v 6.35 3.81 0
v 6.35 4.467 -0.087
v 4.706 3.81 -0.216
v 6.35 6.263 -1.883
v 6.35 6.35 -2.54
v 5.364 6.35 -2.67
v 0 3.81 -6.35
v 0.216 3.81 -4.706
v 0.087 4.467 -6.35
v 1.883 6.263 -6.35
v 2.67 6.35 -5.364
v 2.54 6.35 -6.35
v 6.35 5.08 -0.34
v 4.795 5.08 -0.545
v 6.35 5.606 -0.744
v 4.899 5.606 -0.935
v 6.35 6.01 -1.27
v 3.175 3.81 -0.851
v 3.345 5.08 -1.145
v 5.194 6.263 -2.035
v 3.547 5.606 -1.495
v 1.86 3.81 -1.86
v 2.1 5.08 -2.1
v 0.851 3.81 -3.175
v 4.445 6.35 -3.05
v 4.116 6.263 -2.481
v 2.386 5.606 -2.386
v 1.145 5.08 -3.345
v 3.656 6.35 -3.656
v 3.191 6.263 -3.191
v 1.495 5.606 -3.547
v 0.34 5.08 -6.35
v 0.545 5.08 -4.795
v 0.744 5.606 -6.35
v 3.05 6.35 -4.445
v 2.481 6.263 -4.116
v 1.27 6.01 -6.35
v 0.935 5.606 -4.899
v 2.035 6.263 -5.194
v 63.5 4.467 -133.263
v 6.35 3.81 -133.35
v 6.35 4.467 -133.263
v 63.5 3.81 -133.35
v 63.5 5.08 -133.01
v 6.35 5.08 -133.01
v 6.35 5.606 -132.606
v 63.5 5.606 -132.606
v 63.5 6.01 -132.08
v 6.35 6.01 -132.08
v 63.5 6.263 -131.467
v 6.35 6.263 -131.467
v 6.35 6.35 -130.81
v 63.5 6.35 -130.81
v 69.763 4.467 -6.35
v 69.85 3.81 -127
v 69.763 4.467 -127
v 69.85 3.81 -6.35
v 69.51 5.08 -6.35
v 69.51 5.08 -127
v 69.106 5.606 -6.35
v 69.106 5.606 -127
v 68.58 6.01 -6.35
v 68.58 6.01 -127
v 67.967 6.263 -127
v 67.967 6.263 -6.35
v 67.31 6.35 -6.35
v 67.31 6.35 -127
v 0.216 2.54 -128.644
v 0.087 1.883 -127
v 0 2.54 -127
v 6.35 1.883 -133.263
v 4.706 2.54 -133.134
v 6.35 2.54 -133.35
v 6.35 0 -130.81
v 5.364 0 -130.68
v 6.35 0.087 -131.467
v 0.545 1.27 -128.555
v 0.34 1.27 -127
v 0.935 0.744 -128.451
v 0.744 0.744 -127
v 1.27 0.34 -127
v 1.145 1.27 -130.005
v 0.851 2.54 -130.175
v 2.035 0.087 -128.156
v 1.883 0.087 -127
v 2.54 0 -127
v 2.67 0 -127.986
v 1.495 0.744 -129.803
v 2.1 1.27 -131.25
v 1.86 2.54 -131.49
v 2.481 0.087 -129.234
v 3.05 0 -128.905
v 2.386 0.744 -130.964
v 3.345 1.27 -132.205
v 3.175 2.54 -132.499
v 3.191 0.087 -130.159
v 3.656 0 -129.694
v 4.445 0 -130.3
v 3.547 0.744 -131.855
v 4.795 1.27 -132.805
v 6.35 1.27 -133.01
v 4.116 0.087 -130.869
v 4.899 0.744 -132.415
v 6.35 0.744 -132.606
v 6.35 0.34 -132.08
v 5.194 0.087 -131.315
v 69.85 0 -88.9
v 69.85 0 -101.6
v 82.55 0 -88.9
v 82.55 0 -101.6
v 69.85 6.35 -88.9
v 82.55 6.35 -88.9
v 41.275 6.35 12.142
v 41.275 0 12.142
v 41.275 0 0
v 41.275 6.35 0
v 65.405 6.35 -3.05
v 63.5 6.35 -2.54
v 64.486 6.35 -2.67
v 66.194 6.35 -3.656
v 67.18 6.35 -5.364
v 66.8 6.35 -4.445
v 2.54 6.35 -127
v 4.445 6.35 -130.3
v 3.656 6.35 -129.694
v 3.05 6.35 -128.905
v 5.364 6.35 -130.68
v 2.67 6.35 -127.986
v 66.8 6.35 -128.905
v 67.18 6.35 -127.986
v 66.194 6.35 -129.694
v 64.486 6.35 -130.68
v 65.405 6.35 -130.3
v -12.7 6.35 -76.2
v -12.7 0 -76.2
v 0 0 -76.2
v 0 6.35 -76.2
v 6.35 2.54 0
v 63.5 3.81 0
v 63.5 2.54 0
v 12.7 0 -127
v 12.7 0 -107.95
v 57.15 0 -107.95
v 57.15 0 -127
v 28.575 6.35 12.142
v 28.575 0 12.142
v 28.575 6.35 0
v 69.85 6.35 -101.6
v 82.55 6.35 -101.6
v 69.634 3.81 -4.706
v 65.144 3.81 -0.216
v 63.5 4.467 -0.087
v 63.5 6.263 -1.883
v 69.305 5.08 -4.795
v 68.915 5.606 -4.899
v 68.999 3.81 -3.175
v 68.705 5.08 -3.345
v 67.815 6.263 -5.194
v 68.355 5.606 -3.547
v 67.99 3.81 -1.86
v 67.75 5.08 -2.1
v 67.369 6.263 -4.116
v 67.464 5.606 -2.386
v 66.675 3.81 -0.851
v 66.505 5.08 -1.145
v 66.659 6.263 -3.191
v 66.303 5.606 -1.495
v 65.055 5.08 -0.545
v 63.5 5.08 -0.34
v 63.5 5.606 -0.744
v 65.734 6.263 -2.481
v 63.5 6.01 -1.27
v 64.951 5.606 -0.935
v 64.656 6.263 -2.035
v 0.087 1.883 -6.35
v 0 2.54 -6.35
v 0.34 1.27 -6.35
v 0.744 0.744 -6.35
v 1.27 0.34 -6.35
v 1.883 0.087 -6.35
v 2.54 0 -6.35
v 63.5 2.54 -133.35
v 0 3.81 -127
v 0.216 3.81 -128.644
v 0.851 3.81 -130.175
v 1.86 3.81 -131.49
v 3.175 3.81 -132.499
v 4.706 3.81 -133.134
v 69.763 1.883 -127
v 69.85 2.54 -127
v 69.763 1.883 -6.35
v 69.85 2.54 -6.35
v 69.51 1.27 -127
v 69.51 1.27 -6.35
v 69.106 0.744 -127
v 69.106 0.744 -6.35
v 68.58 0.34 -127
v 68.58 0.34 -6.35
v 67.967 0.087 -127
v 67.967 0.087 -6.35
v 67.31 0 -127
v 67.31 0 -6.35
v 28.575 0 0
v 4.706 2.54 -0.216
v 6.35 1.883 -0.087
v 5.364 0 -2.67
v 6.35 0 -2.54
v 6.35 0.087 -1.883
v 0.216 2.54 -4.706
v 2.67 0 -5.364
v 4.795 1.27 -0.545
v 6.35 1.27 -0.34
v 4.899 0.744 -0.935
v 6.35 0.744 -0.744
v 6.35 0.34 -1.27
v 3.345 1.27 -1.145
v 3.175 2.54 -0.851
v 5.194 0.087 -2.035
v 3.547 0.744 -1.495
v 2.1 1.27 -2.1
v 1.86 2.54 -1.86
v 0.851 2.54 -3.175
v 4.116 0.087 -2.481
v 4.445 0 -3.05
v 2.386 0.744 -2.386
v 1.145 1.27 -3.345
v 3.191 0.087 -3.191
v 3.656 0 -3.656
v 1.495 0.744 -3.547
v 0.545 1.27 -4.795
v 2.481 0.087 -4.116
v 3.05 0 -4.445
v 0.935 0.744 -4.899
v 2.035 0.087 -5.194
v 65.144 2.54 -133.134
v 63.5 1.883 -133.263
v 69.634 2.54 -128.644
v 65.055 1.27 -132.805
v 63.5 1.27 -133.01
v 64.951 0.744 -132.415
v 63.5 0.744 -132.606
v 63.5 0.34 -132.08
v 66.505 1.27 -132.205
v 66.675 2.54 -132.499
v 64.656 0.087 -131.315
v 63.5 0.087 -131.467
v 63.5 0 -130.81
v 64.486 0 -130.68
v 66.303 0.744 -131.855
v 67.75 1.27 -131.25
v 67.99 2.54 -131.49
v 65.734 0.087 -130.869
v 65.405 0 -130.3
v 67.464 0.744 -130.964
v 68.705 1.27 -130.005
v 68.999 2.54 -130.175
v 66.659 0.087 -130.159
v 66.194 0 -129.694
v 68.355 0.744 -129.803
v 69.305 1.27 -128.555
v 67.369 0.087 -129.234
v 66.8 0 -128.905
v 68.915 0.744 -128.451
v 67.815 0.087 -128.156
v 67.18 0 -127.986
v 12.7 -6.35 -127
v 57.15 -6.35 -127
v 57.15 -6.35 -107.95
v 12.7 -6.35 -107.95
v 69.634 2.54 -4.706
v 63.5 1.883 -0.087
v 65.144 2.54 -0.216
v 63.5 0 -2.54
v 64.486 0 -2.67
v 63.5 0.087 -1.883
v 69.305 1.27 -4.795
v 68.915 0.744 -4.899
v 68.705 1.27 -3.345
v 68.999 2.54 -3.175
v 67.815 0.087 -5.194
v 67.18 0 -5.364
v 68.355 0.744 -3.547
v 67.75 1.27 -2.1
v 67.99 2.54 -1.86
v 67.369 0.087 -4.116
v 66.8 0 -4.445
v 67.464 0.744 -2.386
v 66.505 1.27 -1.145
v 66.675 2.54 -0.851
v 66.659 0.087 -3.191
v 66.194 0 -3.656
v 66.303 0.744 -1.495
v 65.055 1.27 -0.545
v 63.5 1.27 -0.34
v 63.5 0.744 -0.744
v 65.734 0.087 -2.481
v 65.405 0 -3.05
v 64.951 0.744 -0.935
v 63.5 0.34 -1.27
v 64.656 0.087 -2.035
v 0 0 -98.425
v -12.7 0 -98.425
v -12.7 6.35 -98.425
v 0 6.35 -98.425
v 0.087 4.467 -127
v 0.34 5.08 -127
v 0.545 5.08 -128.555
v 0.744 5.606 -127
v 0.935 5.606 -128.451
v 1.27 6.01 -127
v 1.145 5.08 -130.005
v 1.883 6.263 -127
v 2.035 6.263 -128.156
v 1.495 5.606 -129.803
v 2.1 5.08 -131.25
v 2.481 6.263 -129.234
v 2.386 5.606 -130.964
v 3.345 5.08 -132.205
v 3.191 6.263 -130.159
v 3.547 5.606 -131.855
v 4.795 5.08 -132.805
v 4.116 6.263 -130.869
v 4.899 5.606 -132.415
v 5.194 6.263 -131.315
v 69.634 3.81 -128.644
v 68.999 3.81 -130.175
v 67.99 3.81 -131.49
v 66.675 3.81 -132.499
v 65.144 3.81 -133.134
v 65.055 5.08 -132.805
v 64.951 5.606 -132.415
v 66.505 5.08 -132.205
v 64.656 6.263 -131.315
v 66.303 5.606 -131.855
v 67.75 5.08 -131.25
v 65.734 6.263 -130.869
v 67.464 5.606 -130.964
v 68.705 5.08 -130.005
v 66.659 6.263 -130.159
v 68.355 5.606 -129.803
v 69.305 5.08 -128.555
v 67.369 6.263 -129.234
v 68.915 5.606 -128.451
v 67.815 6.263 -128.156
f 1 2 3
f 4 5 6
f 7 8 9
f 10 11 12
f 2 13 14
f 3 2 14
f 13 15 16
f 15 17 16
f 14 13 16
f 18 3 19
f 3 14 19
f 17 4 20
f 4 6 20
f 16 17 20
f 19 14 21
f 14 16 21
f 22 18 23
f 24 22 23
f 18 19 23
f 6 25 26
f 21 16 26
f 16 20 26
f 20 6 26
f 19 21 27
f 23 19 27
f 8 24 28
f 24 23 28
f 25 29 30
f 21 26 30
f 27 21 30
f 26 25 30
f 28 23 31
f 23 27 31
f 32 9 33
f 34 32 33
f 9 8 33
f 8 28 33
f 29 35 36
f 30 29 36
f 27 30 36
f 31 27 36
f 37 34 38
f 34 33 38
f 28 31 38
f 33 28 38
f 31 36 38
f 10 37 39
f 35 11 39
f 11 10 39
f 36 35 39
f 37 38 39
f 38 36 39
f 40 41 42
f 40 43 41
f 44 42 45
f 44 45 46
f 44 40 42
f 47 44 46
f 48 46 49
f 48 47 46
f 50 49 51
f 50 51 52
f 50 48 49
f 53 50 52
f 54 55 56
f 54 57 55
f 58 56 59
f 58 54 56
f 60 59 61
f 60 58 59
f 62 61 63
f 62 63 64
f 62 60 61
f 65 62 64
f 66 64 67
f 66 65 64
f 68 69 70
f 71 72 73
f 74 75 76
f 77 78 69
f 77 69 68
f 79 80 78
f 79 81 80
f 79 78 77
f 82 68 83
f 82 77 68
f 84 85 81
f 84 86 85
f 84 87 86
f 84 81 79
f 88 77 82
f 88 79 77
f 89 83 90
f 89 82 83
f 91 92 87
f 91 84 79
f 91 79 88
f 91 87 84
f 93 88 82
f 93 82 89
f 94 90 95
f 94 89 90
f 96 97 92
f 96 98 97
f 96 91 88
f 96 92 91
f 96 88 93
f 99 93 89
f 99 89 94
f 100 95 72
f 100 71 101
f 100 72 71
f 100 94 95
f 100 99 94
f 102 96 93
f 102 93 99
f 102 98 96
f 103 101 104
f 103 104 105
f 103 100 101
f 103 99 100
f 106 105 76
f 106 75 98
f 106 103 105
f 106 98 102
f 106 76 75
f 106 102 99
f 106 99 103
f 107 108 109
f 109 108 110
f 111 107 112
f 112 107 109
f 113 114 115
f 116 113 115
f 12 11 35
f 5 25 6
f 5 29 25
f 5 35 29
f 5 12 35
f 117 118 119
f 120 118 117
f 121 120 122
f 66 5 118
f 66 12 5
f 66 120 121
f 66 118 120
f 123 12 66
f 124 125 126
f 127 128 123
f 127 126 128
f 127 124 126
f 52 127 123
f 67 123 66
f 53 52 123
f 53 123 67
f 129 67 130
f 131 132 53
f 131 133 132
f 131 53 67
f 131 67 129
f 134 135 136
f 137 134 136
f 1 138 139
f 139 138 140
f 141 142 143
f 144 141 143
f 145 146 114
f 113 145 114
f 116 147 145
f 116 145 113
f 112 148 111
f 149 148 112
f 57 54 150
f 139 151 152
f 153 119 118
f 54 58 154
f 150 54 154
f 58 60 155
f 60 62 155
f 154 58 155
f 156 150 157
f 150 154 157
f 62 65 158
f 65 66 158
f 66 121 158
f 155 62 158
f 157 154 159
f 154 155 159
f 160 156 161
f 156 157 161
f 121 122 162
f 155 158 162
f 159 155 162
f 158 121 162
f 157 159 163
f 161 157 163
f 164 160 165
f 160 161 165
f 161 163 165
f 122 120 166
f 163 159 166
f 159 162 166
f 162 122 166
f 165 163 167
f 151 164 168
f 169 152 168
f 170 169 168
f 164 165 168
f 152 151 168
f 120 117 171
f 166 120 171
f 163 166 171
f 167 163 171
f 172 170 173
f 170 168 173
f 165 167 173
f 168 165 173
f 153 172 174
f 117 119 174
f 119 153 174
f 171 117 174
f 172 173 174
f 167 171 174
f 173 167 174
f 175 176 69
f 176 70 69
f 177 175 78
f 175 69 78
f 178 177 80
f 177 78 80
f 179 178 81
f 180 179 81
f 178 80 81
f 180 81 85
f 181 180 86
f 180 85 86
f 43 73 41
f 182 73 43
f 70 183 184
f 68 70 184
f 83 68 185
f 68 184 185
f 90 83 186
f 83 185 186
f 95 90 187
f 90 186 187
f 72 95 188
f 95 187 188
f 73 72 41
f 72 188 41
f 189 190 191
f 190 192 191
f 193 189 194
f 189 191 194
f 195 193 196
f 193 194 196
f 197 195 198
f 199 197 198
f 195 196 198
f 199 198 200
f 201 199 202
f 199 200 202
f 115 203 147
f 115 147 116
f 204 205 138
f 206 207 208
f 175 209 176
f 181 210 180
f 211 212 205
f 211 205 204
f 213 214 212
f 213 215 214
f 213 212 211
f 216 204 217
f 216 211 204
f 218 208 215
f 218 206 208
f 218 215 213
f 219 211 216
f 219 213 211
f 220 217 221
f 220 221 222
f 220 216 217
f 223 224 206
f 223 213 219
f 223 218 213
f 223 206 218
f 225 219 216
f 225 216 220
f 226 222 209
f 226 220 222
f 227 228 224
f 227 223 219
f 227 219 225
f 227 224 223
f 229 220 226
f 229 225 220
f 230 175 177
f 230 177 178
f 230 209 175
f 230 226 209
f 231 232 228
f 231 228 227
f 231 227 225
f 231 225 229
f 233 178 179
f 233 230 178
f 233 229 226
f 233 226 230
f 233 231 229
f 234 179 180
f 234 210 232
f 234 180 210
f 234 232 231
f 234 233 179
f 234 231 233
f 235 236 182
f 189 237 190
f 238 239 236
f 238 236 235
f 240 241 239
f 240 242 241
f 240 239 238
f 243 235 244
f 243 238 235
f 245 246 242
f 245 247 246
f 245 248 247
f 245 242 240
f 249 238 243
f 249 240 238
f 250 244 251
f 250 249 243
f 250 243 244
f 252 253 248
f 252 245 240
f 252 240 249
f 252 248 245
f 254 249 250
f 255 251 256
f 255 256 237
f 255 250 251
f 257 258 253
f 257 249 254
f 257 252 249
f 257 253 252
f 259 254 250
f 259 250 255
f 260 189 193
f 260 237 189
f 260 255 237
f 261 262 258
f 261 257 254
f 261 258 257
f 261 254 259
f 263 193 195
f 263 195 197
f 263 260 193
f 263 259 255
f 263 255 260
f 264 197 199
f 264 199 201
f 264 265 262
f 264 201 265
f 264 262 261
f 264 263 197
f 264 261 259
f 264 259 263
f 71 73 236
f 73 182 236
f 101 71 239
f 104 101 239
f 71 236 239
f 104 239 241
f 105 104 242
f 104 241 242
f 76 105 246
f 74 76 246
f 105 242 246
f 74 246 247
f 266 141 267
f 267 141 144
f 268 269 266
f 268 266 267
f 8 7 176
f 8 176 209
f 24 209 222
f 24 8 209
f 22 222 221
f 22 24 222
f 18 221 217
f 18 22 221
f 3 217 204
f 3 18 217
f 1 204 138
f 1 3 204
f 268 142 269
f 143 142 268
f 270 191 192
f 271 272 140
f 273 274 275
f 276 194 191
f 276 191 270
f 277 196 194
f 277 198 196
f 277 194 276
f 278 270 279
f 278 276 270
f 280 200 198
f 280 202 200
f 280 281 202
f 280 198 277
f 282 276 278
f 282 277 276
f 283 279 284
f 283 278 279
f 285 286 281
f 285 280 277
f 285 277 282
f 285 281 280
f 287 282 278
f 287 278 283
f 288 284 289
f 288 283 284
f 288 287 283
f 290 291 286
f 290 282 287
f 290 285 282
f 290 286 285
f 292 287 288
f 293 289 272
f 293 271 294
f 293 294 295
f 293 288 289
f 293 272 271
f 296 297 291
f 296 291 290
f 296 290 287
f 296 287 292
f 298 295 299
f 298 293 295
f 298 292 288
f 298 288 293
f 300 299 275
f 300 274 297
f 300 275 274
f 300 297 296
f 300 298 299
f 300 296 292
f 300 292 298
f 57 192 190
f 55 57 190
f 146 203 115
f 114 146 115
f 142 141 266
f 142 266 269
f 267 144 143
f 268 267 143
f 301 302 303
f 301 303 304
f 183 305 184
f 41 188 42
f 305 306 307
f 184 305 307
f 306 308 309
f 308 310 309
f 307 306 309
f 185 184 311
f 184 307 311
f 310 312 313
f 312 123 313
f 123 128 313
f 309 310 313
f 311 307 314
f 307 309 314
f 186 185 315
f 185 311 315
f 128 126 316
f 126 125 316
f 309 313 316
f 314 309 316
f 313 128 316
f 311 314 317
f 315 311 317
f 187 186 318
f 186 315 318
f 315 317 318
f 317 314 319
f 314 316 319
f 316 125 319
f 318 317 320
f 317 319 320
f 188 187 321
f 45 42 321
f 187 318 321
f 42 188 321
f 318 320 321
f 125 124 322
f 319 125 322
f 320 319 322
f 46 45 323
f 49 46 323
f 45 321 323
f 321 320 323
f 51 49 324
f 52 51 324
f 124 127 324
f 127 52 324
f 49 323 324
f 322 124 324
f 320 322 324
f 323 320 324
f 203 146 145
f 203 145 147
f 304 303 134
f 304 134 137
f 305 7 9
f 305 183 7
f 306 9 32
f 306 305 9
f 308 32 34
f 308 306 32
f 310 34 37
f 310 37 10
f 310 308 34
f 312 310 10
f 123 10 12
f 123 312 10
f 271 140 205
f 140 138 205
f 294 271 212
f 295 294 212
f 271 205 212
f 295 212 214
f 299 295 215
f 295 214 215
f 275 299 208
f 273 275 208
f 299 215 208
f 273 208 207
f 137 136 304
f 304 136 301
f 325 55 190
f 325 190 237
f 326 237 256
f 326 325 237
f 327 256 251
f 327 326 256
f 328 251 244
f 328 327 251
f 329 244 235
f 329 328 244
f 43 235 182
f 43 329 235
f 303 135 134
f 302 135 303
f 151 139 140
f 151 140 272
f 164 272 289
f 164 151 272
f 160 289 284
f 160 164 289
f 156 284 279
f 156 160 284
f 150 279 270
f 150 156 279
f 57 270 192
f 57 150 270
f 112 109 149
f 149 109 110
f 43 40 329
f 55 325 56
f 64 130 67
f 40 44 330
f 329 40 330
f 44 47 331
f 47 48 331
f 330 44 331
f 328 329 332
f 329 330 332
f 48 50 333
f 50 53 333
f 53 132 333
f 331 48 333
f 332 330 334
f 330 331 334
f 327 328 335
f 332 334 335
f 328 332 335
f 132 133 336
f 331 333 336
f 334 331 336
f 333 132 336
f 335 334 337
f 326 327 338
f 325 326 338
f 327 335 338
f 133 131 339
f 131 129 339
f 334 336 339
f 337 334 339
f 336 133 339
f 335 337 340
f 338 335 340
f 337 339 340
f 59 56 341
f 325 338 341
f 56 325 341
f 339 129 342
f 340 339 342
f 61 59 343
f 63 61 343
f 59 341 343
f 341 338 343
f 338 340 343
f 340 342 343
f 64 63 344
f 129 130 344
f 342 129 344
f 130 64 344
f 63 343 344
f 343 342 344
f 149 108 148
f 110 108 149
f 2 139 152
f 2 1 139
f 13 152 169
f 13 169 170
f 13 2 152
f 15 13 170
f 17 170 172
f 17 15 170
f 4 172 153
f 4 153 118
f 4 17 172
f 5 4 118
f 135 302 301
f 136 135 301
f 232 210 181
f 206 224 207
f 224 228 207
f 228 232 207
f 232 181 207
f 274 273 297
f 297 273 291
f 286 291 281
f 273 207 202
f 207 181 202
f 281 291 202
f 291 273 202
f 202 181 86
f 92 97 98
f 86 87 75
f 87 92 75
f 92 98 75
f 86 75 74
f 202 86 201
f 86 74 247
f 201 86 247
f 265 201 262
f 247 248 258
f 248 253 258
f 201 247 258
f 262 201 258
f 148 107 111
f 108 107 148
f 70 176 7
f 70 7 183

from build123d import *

# Parameters (mm, degrees)
SKETCH1_W           = 69.85
SKETCH1_H           = 133.35
BOSS_EXTRUDE1_DEPTH = 6.35
FILLET2_R           = 6.35
FILLET3_R           = 2.54
SKETCH2_W           = 12.7
SKETCH2_H           = 12.7
BUTTONS_DEPTH       = 6.35
SKETCH2_H_2         = 22.225
BUTTONS_2_DEPTH     = 6.35
SKETCH3_W           = 44.45
SKETCH3_H           = 19.05
CAMERA_DEPTH        = 6.35
SKETCH4_W           = 12.7
SKETCH4_H           = 12.141639095
USB_DEPTH           = 6.35


with BuildPart() as part:
    # Sketch1 → Boss-Extrude1 (new body)
    with BuildSketch(Plane(origin=(0, 0, 0), x_dir=(1, 0, 0), z_dir=(0, 1, 0))):
        with Locations((34.925, 66.675)):
            Rectangle(SKETCH1_W, SKETCH1_H)
    extrude(amount=BOSS_EXTRUDE1_DEPTH)

    # Fillet2
    fillet2_edges = [part.edges().sort_by_distance(p)[0] for p in [
        (0, 3.175, -133.35),
        (69.85, 3.175, -133.35),
        (69.85, 3.175, 0),
        (0, 3.175, 0),
    ]]
    fillet(fillet2_edges, radius=FILLET2_R)

    # Fillet3
    fillet3_edges = [part.edges().sort_by_distance(p)[0] for p in [
        (0, 0, -66.675),
        (0, 6.35, -66.675),
        (34.925, 0, -133.35),
        (69.85, 0, -66.675),
        (34.925, 0, 0),
        (67.990128061, 0, -1.859871939),
        (1.859871939, 0, -1.859871939),
        (67.990128061, 0, -131.490128061),
        (1.859871939, 0, -131.490128061),
        (34.925, 6.35, -133.35),
        (34.925, 6.35, 0),
        (69.85, 6.35, -66.675),
        (67.990128061, 6.35, -1.859871939),
        (1.859871939, 6.35, -1.859871939),
        (67.990128061, 6.35, -131.490128061),
        (1.859871939, 6.35, -131.490128061),
    ]]
    fillet(fillet3_edges, radius=FILLET3_R)


with BuildPart() as body_2:
    # Sketch2 → buttons (new body)
    with BuildSketch(Plane(origin=(0, 0, 0), x_dir=(1, 0, 0), z_dir=(0, 1, 0))):
        with Locations((76.2, 95.25)):
            Rectangle(SKETCH2_W, SKETCH2_H)
    extrude(amount=BUTTONS_DEPTH)


with BuildPart() as body_3:
    # Sketch2 → buttons 2 (new body)
    with BuildSketch(Plane(origin=(0, 0, 0), x_dir=(1, 0, 0), z_dir=(0, 1, 0))):
        with Locations((-6.35, 87.3125)):
            Rectangle(SKETCH2_W, SKETCH2_H_2)
    extrude(amount=BUTTONS_2_DEPTH)


with BuildPart() as body_4:
    # Sketch3 → camera (new body)
    with BuildSketch(Plane.XZ):
        with Locations((34.925, -117.475)):
            Rectangle(SKETCH3_W, SKETCH3_H)
    extrude(amount=CAMERA_DEPTH)


with BuildPart() as body_5:
    # Sketch4 → USB (new body)
    with BuildSketch(Plane(origin=(0, 0, 0), x_dir=(1, 0, 0), z_dir=(0, 1, 0))):
        with Locations((34.925, -6.070819548)):
            Rectangle(SKETCH4_W, SKETCH4_H)
    extrude(amount=USB_DEPTH)


solid = Compound([part.part, body_2.part, body_3.part, body_4.part, body_5.part])
